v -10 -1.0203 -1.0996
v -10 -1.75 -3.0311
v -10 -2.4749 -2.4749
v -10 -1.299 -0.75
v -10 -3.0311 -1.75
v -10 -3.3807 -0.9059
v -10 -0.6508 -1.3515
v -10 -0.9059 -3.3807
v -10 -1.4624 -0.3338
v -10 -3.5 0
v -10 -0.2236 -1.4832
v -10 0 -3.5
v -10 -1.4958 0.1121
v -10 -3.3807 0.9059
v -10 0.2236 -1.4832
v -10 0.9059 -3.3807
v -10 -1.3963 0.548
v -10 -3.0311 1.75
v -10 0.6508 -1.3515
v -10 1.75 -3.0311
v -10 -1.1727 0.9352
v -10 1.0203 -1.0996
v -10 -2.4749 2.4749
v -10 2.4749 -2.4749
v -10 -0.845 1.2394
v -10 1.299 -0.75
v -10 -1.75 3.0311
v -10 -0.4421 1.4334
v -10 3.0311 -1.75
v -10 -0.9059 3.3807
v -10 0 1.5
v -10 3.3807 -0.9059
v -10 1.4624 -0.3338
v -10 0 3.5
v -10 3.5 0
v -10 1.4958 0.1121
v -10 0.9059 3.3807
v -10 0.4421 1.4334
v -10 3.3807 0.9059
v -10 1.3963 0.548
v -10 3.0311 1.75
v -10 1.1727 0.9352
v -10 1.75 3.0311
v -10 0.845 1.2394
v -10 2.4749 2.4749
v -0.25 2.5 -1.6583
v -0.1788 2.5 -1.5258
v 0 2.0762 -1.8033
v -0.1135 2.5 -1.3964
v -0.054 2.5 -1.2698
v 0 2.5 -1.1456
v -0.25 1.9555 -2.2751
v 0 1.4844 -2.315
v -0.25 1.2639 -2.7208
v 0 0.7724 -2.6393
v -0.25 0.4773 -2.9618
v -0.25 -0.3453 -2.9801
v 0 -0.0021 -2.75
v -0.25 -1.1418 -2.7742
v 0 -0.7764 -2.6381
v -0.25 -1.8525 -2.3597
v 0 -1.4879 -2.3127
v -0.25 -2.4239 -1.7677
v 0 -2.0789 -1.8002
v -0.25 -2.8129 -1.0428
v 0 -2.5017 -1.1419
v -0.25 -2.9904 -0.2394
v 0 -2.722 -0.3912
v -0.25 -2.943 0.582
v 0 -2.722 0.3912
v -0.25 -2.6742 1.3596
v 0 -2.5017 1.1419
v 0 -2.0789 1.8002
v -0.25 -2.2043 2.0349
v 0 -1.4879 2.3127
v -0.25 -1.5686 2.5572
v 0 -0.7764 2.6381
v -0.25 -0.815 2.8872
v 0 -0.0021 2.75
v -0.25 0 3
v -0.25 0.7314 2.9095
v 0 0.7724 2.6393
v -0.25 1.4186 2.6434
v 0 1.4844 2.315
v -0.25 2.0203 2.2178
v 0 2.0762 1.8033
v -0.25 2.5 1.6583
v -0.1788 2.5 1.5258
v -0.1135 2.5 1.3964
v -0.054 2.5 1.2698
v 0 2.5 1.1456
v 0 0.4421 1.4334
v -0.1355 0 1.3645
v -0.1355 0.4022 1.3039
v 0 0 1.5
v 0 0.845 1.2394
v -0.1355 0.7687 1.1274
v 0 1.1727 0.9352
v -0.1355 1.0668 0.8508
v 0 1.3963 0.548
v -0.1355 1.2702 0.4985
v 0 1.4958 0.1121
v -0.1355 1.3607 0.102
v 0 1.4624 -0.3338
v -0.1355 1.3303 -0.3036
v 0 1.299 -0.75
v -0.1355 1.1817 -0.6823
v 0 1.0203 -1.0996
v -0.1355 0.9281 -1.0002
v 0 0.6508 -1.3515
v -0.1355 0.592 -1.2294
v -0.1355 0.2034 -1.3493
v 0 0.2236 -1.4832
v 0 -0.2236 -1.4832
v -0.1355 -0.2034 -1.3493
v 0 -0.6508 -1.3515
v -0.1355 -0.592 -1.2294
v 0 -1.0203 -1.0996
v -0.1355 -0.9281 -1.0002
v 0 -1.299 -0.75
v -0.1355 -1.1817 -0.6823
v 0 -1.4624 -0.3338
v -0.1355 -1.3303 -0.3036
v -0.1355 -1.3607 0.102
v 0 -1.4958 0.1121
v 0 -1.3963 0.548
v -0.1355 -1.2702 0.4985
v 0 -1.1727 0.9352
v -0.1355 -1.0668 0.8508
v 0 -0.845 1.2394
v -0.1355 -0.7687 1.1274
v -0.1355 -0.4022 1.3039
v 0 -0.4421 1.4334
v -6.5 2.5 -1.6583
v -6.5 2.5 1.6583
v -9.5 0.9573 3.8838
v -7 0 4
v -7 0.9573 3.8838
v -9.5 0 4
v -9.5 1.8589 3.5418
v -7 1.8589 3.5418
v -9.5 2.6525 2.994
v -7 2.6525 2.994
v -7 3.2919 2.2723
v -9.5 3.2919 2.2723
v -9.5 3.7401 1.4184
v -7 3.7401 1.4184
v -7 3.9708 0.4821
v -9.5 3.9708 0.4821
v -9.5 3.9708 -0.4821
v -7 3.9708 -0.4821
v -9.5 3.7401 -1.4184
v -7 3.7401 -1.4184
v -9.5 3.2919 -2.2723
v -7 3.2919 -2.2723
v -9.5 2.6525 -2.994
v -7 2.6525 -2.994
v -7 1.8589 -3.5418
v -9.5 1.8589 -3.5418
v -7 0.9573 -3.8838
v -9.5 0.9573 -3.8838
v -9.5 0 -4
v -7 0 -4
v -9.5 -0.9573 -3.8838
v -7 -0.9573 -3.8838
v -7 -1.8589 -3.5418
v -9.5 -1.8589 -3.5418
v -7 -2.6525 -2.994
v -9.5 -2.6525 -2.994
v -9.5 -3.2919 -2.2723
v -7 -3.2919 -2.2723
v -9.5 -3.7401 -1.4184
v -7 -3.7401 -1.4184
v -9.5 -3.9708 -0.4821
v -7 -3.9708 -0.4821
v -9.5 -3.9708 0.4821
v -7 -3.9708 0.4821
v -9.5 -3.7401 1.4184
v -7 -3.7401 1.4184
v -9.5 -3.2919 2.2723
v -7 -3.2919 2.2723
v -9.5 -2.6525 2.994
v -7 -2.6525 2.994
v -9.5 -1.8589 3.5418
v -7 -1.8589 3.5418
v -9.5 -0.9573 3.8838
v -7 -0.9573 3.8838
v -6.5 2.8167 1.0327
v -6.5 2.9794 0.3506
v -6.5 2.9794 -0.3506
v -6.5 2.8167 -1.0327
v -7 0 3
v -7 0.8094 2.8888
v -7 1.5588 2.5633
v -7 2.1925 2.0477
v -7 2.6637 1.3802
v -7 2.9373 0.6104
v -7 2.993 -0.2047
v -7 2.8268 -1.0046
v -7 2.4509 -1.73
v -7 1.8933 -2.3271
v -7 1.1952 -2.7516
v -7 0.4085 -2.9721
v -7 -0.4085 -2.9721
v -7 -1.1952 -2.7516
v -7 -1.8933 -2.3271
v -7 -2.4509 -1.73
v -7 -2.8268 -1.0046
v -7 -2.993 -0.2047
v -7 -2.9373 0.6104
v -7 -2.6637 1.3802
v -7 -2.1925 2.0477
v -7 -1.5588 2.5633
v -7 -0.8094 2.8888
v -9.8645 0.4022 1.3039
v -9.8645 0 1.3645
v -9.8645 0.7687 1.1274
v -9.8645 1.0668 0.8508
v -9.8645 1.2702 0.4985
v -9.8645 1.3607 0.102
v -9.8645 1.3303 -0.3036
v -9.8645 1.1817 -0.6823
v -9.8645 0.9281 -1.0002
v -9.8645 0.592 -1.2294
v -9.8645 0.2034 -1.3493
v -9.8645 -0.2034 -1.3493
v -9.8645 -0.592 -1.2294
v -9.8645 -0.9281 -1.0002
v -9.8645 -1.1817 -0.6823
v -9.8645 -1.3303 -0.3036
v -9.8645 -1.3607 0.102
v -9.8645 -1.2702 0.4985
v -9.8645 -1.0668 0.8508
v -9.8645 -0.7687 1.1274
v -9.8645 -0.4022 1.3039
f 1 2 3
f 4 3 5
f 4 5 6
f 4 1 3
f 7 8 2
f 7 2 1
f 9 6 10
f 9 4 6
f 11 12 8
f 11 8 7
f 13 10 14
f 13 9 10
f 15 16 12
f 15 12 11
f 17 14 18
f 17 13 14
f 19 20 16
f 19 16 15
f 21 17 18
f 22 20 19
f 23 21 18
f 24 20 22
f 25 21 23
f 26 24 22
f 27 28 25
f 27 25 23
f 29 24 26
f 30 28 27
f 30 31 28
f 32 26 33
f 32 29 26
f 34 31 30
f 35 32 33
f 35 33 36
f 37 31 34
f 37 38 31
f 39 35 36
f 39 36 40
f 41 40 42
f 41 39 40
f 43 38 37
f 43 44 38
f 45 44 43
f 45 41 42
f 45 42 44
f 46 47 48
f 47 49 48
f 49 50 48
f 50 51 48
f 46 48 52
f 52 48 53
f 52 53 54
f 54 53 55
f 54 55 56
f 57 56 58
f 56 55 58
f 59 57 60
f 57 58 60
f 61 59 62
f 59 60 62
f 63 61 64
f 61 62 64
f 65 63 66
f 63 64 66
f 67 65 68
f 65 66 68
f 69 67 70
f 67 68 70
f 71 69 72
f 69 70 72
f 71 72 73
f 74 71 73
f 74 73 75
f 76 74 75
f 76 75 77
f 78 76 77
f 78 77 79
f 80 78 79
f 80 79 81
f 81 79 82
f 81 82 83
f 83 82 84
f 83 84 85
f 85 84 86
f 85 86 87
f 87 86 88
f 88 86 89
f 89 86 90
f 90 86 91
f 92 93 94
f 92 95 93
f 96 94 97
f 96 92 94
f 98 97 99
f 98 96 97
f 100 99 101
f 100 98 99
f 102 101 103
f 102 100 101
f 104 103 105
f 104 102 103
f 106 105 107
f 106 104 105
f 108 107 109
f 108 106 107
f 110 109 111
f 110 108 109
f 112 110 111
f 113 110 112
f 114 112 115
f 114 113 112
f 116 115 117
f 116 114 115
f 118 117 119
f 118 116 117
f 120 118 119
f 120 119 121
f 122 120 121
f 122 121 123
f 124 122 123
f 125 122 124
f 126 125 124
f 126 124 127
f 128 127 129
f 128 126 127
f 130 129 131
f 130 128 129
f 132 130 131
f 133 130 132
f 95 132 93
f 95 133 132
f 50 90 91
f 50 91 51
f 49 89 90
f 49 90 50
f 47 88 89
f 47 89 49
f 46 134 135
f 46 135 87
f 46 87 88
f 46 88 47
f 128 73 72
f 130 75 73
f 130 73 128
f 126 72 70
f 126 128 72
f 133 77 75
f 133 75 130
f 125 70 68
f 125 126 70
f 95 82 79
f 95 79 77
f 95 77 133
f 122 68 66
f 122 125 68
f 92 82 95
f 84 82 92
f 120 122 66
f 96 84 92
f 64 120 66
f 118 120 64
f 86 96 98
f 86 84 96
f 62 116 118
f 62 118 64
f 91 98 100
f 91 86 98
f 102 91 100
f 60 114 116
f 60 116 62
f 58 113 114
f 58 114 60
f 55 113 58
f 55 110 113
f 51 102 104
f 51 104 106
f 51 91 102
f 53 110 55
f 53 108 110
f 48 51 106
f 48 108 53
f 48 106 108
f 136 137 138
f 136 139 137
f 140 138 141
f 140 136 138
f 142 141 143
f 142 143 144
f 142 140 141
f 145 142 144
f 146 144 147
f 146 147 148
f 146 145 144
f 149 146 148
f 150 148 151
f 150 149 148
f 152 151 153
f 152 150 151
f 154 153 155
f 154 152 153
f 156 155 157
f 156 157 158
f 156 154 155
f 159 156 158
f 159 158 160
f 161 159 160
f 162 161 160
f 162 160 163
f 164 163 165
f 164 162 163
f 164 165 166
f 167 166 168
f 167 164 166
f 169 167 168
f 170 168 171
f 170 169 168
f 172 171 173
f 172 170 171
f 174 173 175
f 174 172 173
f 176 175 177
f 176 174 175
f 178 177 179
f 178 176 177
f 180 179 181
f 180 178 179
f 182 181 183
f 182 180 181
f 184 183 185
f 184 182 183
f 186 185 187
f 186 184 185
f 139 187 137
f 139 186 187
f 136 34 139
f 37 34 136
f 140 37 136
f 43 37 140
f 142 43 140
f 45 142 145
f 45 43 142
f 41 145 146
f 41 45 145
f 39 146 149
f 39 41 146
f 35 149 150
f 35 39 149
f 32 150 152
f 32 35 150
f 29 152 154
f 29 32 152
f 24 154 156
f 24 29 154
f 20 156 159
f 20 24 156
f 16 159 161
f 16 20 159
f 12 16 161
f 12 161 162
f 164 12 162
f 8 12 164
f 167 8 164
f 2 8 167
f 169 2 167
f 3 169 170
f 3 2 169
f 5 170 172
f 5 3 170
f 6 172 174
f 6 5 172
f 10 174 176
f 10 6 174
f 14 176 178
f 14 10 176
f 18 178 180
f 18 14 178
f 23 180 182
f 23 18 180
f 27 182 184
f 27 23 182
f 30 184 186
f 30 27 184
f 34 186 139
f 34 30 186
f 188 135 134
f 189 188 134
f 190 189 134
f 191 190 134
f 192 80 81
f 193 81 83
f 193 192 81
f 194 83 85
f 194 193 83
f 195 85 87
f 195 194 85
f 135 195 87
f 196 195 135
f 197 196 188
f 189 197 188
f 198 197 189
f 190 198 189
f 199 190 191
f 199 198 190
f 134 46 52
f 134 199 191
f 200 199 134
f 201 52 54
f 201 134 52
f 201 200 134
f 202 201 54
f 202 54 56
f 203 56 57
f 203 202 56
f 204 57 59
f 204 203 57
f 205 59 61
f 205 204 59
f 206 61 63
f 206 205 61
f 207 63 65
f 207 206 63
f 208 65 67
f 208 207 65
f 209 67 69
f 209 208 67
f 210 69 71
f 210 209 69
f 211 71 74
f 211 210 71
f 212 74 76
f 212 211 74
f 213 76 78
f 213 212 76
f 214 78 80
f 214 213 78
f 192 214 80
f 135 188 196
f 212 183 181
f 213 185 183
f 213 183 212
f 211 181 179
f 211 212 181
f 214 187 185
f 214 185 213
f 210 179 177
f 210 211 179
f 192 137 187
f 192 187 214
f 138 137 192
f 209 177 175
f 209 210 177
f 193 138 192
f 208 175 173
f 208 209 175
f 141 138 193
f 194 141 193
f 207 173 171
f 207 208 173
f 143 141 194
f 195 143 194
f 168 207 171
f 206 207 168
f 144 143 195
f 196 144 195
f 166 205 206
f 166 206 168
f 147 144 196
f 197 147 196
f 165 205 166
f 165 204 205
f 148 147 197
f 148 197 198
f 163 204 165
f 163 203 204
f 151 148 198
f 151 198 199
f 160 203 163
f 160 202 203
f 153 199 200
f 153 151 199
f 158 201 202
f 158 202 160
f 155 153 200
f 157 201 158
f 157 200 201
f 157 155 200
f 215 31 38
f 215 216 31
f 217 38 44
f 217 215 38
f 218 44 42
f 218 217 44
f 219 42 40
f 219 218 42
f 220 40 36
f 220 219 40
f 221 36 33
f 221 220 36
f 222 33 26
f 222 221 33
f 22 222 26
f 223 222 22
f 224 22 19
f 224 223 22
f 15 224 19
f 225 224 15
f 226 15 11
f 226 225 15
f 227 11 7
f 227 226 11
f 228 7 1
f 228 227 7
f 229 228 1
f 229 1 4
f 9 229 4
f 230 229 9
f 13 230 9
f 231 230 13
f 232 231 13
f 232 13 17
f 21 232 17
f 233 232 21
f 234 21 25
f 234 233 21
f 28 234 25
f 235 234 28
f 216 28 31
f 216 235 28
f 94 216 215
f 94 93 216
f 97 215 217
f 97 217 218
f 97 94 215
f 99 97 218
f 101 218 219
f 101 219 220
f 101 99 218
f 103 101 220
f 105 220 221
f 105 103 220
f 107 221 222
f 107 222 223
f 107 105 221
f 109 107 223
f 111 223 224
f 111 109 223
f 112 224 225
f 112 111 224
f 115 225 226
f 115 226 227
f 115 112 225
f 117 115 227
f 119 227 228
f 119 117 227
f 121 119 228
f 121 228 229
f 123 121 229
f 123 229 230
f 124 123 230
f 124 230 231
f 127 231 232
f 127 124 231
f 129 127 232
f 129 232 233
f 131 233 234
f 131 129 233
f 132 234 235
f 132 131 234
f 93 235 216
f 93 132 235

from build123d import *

# Parameters (mm, degrees)
SKETCH_2_W          = 6.5
SKETCH_2_H          = 8
CUT_EXTRUDE_1_DEPTH = 3


with BuildPart() as part:
    # 草图1 → 旋转1 (revolve)
    with BuildSketch(Plane.XY):
        Polygon((-10, 1.5), (-9.8645, 1.3645), (-0.1355, 1.3645), (0, 1.5), (0, 3), (-7, 3), (-7, 4), (-9.5, 4), (-10, 3.5), align=None)
    revolve(axis=Axis((0, 0, 0), (-1, 0, 0)))

    # 草图2 → 切除-拉伸1 (cut)
    with BuildSketch(Plane(origin=(0, 2.5, 0), x_dir=(1, 0, 0), z_dir=(0, 1, 0))):
        with Locations((-3.25, 0)):
            Rectangle(SKETCH_2_W, SKETCH_2_H)
    extrude(amount=CUT_EXTRUDE_1_DEPTH, mode=Mode.SUBTRACT)

    # 草图3 → 切除-旋转1 (revolve, cut)
    with BuildSketch(Plane.XY):
        Polygon((-0.25, 3), (0, 2.75), (0, 3), align=None)
    revolve(axis=Axis((0, 0, 0), (-1, 0, 0)), mode=Mode.SUBTRACT)


solid = part.part
